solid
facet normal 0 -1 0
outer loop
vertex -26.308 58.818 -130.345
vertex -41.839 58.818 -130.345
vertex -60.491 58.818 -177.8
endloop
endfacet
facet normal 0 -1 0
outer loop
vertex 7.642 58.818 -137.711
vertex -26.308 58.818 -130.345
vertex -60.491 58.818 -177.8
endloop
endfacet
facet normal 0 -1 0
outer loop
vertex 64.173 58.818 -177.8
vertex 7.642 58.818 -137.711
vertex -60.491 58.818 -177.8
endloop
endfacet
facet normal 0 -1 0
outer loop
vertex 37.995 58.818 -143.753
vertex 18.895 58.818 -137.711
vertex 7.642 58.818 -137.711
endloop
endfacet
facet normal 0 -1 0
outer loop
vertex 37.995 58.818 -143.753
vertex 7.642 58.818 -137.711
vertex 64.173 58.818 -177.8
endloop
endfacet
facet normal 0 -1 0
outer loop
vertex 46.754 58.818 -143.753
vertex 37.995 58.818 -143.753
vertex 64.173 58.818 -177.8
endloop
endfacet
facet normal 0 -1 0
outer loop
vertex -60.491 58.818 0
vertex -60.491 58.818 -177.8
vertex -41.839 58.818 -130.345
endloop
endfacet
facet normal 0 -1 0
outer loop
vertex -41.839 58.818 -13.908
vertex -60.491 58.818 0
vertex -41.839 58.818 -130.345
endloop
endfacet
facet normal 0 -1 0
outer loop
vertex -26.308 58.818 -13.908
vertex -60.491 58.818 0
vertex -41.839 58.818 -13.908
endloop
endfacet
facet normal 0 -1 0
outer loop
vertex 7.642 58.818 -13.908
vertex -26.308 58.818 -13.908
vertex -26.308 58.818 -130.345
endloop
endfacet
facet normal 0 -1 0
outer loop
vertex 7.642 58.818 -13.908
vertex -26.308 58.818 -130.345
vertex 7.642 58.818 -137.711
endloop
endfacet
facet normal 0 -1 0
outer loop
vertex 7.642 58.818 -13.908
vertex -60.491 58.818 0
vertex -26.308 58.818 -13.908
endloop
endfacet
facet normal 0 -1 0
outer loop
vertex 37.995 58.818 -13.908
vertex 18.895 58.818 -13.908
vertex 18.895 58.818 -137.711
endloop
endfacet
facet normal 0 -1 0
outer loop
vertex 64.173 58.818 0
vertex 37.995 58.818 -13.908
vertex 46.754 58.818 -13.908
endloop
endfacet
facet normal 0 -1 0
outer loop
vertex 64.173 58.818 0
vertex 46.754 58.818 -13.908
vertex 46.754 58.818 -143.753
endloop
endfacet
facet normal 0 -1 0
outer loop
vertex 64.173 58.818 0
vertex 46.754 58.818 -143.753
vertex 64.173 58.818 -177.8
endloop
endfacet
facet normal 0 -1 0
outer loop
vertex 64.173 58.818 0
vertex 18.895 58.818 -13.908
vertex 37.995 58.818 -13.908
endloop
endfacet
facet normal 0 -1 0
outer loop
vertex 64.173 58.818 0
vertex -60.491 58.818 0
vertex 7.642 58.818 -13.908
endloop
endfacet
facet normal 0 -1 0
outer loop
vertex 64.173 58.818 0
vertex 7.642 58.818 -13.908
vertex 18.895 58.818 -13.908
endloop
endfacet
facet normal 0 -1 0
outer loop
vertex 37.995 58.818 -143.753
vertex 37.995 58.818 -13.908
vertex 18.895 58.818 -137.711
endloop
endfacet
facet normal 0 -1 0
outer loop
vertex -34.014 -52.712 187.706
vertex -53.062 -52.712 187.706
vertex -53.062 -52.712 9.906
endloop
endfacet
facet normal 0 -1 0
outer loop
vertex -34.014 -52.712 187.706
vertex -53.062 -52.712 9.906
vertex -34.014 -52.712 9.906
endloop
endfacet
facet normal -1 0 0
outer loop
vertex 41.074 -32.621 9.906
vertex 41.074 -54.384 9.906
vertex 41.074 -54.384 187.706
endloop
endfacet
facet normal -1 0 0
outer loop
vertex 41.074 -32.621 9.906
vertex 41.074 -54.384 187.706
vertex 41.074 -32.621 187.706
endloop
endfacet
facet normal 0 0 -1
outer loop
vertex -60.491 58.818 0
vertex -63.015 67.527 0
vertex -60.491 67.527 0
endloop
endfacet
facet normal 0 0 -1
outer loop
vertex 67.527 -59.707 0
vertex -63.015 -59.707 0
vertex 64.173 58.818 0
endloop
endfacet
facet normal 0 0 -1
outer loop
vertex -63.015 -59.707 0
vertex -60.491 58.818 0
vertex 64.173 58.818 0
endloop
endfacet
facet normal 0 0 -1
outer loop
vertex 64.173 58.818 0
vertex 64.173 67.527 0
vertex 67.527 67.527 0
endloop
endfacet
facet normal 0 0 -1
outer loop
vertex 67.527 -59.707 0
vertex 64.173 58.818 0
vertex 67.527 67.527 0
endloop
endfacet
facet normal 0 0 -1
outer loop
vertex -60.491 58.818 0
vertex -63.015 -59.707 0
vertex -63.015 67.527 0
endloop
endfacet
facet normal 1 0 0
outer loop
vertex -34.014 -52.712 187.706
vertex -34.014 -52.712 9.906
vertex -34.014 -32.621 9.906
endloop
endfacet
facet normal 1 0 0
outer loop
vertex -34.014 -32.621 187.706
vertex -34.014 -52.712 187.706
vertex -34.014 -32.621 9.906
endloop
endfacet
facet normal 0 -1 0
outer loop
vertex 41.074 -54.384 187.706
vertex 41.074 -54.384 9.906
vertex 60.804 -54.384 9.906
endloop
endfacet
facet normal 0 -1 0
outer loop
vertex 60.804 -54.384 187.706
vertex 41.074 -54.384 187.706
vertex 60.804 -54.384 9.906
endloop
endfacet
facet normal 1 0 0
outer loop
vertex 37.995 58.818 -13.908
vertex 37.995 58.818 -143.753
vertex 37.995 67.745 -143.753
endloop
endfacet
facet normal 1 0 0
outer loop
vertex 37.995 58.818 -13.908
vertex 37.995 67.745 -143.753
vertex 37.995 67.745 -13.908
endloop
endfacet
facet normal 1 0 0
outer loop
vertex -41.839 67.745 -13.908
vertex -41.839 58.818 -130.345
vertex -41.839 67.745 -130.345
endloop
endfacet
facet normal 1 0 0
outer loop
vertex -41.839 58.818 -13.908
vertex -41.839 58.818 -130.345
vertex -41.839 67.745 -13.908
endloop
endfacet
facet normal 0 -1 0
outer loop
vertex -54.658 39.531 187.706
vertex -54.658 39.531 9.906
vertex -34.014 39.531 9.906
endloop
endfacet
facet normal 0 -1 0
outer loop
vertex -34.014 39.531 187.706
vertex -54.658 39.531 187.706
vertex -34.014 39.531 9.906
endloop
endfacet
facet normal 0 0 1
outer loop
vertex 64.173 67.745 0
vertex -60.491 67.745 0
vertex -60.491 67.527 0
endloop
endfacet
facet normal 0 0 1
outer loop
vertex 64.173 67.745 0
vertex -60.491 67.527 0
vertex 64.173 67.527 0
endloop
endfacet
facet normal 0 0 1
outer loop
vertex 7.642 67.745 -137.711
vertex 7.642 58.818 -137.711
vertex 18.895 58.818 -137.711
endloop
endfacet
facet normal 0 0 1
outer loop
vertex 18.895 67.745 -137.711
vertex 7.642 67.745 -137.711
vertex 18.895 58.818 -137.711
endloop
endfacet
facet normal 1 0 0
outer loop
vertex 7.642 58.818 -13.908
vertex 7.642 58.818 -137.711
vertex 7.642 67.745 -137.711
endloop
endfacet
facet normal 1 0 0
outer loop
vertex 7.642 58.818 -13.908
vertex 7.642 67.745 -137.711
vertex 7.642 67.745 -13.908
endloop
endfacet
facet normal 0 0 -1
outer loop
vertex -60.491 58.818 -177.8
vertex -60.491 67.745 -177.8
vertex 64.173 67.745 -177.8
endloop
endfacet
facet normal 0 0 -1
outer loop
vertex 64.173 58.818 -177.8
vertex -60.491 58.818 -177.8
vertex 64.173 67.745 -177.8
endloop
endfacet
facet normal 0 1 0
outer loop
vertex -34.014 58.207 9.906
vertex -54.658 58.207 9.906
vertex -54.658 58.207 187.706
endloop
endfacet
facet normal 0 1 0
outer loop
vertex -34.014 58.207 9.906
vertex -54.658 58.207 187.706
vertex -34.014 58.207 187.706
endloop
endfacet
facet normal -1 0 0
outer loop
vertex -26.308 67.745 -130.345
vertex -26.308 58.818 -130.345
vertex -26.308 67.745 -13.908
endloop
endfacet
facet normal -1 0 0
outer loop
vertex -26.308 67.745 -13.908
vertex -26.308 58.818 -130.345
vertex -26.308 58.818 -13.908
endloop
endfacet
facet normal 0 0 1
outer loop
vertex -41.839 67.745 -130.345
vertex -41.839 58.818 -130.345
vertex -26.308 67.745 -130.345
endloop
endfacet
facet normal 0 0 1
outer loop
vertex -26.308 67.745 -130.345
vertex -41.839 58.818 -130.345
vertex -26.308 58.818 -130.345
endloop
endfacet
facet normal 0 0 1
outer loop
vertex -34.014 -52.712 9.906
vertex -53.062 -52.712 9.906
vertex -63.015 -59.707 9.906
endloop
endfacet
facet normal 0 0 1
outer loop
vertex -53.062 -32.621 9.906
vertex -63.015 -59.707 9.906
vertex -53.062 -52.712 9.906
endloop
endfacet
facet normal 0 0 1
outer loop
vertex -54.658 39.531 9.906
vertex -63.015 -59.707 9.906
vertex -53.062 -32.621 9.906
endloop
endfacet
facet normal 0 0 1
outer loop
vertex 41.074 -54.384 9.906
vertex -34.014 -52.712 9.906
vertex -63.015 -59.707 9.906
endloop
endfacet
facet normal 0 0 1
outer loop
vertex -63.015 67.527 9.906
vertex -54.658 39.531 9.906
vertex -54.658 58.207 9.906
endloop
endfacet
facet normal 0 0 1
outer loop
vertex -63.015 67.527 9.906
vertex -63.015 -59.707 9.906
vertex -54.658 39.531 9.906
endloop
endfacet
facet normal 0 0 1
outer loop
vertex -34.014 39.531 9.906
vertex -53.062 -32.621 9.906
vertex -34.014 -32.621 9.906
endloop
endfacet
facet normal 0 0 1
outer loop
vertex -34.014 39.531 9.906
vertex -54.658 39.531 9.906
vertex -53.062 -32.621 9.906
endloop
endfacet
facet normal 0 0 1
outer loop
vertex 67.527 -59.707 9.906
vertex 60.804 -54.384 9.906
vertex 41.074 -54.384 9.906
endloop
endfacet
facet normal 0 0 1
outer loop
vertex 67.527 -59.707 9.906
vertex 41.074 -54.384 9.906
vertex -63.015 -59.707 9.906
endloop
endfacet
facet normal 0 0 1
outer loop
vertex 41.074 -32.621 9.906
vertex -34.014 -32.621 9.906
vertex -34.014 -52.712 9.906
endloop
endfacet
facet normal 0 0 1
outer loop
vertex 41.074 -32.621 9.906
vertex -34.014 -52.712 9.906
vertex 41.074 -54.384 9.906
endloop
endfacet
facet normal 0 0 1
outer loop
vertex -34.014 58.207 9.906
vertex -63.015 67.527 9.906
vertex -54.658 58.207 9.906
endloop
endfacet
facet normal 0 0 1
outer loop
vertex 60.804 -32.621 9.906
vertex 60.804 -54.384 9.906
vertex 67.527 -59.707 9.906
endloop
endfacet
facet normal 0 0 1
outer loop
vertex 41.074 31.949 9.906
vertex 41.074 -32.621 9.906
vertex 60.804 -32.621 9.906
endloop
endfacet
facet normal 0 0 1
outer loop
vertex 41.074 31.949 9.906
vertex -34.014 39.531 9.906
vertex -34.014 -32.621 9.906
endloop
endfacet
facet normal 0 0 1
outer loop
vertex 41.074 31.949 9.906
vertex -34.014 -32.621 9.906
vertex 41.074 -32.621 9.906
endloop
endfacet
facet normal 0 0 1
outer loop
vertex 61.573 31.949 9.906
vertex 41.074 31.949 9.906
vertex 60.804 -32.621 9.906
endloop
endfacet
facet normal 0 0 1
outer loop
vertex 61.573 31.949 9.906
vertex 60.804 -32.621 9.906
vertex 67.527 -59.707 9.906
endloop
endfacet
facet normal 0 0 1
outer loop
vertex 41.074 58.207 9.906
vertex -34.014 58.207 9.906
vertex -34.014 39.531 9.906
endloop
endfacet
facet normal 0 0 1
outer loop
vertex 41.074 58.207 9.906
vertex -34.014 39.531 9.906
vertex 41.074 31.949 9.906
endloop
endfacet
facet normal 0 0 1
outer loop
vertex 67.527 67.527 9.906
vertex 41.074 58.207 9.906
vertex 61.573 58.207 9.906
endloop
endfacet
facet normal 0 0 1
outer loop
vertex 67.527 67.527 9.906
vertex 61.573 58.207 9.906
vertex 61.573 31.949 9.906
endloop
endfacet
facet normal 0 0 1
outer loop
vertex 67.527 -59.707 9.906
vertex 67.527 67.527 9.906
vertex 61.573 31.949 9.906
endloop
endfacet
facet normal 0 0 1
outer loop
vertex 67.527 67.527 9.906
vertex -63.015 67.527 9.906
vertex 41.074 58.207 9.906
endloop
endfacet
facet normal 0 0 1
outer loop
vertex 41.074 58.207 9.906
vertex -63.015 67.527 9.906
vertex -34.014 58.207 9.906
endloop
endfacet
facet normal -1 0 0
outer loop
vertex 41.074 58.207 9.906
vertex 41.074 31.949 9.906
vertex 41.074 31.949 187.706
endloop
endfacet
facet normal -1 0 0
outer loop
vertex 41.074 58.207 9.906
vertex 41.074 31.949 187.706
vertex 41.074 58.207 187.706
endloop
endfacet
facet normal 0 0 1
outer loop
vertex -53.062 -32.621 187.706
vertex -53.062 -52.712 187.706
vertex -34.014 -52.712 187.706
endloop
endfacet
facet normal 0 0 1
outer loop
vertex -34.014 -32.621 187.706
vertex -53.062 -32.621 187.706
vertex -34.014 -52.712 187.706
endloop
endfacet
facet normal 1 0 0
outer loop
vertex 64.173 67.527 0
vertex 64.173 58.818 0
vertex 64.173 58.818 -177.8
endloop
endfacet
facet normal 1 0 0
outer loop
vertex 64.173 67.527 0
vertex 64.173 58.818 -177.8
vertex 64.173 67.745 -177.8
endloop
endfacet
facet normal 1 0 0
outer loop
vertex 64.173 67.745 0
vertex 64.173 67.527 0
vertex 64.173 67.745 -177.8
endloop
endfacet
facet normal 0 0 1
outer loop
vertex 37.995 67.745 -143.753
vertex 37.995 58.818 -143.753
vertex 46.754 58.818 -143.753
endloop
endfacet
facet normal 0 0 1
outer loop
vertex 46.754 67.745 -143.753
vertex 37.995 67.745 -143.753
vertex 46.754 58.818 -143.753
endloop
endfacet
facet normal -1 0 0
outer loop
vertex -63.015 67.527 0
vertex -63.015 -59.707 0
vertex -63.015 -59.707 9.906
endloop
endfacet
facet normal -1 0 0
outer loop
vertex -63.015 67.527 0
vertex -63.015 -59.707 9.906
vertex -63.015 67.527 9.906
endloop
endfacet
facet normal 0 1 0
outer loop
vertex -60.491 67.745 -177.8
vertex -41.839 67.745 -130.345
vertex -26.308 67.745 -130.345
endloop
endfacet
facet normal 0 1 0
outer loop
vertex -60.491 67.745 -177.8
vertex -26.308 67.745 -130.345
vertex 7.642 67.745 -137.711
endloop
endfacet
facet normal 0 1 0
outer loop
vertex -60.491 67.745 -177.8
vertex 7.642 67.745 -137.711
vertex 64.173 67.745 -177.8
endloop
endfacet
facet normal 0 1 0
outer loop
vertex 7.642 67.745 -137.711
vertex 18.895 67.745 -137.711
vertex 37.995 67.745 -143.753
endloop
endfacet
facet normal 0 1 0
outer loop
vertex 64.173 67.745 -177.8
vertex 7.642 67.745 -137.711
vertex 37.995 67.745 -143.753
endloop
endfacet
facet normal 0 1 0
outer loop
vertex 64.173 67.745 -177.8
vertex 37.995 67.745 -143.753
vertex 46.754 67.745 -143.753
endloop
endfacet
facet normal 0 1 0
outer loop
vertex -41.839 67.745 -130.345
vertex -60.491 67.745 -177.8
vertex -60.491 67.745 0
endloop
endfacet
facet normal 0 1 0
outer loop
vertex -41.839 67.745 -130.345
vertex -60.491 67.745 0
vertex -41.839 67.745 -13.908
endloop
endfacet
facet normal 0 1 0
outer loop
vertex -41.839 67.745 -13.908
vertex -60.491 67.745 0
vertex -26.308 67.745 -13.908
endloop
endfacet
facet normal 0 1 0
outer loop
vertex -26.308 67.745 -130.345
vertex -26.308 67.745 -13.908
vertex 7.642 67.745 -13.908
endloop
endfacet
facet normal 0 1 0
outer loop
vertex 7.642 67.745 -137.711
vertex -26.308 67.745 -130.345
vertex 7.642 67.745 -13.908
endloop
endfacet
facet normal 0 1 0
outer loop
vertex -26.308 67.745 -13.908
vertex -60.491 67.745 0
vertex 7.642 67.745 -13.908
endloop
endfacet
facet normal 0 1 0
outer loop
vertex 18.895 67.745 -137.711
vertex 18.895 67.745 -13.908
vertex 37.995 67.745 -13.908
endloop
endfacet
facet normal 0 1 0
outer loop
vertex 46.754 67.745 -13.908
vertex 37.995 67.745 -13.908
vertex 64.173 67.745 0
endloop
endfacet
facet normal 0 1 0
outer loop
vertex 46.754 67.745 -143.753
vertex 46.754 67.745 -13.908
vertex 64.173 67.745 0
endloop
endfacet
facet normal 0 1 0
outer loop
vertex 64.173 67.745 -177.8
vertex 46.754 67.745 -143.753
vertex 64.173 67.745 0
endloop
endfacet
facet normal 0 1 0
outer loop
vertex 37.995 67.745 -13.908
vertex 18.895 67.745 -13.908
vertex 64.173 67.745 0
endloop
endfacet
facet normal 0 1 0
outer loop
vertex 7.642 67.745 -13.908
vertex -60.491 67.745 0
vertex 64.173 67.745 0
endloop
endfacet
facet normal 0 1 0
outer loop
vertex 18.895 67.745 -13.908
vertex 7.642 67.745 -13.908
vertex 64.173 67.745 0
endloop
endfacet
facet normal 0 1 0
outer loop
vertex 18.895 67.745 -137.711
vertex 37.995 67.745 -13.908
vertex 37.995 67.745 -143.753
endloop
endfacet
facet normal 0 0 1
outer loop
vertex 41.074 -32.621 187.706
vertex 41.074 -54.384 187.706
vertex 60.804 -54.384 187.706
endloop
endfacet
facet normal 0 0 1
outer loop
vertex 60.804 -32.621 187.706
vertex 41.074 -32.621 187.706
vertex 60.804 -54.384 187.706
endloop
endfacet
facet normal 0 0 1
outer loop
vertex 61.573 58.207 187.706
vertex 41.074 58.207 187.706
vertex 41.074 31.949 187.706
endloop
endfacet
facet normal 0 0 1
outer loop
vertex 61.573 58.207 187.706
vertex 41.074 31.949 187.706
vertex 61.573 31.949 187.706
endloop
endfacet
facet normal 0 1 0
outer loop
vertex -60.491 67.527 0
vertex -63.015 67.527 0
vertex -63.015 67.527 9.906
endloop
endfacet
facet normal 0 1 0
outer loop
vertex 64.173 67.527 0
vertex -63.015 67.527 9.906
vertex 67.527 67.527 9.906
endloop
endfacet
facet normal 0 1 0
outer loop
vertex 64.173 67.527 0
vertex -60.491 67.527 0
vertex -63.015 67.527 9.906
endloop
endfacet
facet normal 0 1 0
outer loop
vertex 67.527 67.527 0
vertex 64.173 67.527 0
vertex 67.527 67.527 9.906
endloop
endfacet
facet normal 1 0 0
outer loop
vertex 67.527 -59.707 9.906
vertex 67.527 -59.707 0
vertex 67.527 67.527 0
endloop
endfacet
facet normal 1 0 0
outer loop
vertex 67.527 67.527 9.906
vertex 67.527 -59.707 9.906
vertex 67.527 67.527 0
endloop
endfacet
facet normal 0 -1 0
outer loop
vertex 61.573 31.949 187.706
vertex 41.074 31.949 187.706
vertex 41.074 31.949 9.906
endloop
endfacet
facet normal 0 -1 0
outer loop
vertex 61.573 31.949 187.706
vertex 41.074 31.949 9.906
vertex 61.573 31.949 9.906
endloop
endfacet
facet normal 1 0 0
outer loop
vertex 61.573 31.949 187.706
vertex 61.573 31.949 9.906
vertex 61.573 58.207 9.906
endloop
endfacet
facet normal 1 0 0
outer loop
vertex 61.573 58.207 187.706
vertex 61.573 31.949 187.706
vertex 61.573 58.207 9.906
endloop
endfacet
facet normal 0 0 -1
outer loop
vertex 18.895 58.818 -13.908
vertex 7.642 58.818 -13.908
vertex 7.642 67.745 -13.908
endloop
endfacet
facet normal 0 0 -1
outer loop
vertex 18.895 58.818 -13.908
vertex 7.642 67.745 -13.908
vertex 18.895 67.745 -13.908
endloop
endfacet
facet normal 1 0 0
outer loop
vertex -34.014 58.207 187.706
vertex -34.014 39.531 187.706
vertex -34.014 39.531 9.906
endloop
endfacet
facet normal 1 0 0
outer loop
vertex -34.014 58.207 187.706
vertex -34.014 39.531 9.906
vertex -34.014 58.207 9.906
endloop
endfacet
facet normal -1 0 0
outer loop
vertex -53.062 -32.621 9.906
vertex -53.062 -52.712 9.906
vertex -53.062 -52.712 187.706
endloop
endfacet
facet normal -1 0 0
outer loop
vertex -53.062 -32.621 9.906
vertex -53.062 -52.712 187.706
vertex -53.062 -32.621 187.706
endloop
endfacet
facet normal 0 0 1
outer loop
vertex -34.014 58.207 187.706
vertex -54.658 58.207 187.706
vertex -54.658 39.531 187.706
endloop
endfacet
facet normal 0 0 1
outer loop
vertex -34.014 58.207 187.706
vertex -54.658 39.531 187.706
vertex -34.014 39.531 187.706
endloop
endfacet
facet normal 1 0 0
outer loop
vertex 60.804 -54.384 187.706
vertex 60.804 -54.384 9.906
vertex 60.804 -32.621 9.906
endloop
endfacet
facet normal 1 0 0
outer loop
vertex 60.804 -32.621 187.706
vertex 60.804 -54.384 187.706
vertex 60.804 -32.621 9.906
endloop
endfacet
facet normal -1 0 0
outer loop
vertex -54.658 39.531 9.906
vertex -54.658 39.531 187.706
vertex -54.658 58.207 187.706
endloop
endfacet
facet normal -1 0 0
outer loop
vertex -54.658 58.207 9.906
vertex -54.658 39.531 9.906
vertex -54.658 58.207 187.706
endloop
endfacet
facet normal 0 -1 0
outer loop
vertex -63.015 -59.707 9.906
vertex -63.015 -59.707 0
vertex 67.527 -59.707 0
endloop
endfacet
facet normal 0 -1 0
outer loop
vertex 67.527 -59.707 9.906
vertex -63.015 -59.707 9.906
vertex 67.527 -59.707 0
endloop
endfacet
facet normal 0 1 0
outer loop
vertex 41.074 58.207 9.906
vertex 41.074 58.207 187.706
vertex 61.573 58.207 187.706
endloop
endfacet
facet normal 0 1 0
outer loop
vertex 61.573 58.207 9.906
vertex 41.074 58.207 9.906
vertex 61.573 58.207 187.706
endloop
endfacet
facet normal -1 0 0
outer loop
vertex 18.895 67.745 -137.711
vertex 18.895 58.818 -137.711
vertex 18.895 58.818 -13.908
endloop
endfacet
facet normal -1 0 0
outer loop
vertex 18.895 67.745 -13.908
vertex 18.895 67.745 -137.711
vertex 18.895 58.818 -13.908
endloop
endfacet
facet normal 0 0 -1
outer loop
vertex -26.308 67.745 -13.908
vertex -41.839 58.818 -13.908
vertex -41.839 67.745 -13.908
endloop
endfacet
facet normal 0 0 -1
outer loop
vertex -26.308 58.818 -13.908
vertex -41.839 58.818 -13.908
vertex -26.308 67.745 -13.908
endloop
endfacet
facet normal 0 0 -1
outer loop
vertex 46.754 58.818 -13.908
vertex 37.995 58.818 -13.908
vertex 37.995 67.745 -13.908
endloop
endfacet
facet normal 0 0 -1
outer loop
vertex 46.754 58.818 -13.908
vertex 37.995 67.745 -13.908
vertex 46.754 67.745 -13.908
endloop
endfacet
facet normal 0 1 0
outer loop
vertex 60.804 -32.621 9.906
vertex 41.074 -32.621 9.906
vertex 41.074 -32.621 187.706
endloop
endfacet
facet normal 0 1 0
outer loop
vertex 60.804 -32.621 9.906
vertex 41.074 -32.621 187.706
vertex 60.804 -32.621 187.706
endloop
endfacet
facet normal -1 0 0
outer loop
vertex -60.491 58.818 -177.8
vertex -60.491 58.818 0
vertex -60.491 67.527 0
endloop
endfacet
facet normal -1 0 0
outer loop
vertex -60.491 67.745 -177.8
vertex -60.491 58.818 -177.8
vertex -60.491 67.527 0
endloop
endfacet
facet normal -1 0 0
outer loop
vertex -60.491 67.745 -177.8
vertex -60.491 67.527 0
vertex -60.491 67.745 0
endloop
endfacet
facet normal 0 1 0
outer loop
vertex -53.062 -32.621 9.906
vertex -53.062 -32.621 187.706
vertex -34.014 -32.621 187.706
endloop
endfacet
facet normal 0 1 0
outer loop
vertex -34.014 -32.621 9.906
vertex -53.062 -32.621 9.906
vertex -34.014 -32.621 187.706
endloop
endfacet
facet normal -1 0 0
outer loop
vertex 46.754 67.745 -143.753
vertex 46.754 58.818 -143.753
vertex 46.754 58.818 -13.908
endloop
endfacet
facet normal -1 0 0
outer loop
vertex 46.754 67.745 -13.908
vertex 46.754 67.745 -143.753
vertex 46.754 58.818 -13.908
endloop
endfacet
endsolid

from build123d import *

# Parameters (mm, degrees)
F0_W     = 130.542636
F0_H     = 127.233949
F1_DEPTH = 9.906
F2_W     = 19.73008
F2_H     = 21.76354
F2_W_2   = 20.498451
F2_H_2   = 26.257996
F2_W_3   = 20.644247
F2_H_3   = 18.675257
F2_W_4   = 19.04821
F2_H_4   = 20.091395
F3_DEPTH = 187.706
F4_W     = 124.663566
F4_H     = 8.92711
F5_DEPTH = 177.8
F6_W     = 8.759178
F6_H     = 129.845535
F6_W_2   = 11.253112
F6_H_2   = 123.803681
F6_W_3   = 15.531029
F6_H_3   = 116.437322
F7_DEPTH = 25.4


with BuildPart() as f1:
    # F0 (on Top) → F1 (new body)
    with BuildSketch(Plane.XY):
        with Locations((2.255924, 3.91026)):
            Rectangle(F0_W, F0_H)
    extrude(amount=F1_DEPTH)

    # F2 (on face) → F3 (join)
    with BuildSketch(Plane.XY):
        with Locations((50.939338, -43.50264)):
            Rectangle(F2_W, F2_H)
        with Locations((51.323523, 45.077661)):
            Rectangle(F2_W_2, F2_H_2)
        with Locations((-44.336367, 48.86903)):
            Rectangle(F2_W_3, F2_H_3)
        with Locations((-43.538349, -42.666567)):
            Rectangle(F2_W_4, F2_H_4)
    extrude(amount=F3_DEPTH)

    # F4 (on face) → F5 (join)
    with BuildSketch(Plane.XY):
        with Locations((1.841141, 63.281318)):
            Rectangle(F4_W, F4_H)
    extrude(amount=-F5_DEPTH)

    # F6 (on face) → F7 (cut)
    with BuildSketch(Plane.XZ.offset(-58.817763)):
        with Locations((42.374756, -78.830328)):
            Rectangle(F6_W, F6_H)
        with Locations((13.268729, -75.809401)):
            Rectangle(F6_W_2, F6_H_2)
        with Locations((-34.073861, -72.126222)):
            Rectangle(F6_W_3, F6_H_3)
    extrude(amount=-F7_DEPTH, mode=Mode.SUBTRACT)


solid = f1.part
